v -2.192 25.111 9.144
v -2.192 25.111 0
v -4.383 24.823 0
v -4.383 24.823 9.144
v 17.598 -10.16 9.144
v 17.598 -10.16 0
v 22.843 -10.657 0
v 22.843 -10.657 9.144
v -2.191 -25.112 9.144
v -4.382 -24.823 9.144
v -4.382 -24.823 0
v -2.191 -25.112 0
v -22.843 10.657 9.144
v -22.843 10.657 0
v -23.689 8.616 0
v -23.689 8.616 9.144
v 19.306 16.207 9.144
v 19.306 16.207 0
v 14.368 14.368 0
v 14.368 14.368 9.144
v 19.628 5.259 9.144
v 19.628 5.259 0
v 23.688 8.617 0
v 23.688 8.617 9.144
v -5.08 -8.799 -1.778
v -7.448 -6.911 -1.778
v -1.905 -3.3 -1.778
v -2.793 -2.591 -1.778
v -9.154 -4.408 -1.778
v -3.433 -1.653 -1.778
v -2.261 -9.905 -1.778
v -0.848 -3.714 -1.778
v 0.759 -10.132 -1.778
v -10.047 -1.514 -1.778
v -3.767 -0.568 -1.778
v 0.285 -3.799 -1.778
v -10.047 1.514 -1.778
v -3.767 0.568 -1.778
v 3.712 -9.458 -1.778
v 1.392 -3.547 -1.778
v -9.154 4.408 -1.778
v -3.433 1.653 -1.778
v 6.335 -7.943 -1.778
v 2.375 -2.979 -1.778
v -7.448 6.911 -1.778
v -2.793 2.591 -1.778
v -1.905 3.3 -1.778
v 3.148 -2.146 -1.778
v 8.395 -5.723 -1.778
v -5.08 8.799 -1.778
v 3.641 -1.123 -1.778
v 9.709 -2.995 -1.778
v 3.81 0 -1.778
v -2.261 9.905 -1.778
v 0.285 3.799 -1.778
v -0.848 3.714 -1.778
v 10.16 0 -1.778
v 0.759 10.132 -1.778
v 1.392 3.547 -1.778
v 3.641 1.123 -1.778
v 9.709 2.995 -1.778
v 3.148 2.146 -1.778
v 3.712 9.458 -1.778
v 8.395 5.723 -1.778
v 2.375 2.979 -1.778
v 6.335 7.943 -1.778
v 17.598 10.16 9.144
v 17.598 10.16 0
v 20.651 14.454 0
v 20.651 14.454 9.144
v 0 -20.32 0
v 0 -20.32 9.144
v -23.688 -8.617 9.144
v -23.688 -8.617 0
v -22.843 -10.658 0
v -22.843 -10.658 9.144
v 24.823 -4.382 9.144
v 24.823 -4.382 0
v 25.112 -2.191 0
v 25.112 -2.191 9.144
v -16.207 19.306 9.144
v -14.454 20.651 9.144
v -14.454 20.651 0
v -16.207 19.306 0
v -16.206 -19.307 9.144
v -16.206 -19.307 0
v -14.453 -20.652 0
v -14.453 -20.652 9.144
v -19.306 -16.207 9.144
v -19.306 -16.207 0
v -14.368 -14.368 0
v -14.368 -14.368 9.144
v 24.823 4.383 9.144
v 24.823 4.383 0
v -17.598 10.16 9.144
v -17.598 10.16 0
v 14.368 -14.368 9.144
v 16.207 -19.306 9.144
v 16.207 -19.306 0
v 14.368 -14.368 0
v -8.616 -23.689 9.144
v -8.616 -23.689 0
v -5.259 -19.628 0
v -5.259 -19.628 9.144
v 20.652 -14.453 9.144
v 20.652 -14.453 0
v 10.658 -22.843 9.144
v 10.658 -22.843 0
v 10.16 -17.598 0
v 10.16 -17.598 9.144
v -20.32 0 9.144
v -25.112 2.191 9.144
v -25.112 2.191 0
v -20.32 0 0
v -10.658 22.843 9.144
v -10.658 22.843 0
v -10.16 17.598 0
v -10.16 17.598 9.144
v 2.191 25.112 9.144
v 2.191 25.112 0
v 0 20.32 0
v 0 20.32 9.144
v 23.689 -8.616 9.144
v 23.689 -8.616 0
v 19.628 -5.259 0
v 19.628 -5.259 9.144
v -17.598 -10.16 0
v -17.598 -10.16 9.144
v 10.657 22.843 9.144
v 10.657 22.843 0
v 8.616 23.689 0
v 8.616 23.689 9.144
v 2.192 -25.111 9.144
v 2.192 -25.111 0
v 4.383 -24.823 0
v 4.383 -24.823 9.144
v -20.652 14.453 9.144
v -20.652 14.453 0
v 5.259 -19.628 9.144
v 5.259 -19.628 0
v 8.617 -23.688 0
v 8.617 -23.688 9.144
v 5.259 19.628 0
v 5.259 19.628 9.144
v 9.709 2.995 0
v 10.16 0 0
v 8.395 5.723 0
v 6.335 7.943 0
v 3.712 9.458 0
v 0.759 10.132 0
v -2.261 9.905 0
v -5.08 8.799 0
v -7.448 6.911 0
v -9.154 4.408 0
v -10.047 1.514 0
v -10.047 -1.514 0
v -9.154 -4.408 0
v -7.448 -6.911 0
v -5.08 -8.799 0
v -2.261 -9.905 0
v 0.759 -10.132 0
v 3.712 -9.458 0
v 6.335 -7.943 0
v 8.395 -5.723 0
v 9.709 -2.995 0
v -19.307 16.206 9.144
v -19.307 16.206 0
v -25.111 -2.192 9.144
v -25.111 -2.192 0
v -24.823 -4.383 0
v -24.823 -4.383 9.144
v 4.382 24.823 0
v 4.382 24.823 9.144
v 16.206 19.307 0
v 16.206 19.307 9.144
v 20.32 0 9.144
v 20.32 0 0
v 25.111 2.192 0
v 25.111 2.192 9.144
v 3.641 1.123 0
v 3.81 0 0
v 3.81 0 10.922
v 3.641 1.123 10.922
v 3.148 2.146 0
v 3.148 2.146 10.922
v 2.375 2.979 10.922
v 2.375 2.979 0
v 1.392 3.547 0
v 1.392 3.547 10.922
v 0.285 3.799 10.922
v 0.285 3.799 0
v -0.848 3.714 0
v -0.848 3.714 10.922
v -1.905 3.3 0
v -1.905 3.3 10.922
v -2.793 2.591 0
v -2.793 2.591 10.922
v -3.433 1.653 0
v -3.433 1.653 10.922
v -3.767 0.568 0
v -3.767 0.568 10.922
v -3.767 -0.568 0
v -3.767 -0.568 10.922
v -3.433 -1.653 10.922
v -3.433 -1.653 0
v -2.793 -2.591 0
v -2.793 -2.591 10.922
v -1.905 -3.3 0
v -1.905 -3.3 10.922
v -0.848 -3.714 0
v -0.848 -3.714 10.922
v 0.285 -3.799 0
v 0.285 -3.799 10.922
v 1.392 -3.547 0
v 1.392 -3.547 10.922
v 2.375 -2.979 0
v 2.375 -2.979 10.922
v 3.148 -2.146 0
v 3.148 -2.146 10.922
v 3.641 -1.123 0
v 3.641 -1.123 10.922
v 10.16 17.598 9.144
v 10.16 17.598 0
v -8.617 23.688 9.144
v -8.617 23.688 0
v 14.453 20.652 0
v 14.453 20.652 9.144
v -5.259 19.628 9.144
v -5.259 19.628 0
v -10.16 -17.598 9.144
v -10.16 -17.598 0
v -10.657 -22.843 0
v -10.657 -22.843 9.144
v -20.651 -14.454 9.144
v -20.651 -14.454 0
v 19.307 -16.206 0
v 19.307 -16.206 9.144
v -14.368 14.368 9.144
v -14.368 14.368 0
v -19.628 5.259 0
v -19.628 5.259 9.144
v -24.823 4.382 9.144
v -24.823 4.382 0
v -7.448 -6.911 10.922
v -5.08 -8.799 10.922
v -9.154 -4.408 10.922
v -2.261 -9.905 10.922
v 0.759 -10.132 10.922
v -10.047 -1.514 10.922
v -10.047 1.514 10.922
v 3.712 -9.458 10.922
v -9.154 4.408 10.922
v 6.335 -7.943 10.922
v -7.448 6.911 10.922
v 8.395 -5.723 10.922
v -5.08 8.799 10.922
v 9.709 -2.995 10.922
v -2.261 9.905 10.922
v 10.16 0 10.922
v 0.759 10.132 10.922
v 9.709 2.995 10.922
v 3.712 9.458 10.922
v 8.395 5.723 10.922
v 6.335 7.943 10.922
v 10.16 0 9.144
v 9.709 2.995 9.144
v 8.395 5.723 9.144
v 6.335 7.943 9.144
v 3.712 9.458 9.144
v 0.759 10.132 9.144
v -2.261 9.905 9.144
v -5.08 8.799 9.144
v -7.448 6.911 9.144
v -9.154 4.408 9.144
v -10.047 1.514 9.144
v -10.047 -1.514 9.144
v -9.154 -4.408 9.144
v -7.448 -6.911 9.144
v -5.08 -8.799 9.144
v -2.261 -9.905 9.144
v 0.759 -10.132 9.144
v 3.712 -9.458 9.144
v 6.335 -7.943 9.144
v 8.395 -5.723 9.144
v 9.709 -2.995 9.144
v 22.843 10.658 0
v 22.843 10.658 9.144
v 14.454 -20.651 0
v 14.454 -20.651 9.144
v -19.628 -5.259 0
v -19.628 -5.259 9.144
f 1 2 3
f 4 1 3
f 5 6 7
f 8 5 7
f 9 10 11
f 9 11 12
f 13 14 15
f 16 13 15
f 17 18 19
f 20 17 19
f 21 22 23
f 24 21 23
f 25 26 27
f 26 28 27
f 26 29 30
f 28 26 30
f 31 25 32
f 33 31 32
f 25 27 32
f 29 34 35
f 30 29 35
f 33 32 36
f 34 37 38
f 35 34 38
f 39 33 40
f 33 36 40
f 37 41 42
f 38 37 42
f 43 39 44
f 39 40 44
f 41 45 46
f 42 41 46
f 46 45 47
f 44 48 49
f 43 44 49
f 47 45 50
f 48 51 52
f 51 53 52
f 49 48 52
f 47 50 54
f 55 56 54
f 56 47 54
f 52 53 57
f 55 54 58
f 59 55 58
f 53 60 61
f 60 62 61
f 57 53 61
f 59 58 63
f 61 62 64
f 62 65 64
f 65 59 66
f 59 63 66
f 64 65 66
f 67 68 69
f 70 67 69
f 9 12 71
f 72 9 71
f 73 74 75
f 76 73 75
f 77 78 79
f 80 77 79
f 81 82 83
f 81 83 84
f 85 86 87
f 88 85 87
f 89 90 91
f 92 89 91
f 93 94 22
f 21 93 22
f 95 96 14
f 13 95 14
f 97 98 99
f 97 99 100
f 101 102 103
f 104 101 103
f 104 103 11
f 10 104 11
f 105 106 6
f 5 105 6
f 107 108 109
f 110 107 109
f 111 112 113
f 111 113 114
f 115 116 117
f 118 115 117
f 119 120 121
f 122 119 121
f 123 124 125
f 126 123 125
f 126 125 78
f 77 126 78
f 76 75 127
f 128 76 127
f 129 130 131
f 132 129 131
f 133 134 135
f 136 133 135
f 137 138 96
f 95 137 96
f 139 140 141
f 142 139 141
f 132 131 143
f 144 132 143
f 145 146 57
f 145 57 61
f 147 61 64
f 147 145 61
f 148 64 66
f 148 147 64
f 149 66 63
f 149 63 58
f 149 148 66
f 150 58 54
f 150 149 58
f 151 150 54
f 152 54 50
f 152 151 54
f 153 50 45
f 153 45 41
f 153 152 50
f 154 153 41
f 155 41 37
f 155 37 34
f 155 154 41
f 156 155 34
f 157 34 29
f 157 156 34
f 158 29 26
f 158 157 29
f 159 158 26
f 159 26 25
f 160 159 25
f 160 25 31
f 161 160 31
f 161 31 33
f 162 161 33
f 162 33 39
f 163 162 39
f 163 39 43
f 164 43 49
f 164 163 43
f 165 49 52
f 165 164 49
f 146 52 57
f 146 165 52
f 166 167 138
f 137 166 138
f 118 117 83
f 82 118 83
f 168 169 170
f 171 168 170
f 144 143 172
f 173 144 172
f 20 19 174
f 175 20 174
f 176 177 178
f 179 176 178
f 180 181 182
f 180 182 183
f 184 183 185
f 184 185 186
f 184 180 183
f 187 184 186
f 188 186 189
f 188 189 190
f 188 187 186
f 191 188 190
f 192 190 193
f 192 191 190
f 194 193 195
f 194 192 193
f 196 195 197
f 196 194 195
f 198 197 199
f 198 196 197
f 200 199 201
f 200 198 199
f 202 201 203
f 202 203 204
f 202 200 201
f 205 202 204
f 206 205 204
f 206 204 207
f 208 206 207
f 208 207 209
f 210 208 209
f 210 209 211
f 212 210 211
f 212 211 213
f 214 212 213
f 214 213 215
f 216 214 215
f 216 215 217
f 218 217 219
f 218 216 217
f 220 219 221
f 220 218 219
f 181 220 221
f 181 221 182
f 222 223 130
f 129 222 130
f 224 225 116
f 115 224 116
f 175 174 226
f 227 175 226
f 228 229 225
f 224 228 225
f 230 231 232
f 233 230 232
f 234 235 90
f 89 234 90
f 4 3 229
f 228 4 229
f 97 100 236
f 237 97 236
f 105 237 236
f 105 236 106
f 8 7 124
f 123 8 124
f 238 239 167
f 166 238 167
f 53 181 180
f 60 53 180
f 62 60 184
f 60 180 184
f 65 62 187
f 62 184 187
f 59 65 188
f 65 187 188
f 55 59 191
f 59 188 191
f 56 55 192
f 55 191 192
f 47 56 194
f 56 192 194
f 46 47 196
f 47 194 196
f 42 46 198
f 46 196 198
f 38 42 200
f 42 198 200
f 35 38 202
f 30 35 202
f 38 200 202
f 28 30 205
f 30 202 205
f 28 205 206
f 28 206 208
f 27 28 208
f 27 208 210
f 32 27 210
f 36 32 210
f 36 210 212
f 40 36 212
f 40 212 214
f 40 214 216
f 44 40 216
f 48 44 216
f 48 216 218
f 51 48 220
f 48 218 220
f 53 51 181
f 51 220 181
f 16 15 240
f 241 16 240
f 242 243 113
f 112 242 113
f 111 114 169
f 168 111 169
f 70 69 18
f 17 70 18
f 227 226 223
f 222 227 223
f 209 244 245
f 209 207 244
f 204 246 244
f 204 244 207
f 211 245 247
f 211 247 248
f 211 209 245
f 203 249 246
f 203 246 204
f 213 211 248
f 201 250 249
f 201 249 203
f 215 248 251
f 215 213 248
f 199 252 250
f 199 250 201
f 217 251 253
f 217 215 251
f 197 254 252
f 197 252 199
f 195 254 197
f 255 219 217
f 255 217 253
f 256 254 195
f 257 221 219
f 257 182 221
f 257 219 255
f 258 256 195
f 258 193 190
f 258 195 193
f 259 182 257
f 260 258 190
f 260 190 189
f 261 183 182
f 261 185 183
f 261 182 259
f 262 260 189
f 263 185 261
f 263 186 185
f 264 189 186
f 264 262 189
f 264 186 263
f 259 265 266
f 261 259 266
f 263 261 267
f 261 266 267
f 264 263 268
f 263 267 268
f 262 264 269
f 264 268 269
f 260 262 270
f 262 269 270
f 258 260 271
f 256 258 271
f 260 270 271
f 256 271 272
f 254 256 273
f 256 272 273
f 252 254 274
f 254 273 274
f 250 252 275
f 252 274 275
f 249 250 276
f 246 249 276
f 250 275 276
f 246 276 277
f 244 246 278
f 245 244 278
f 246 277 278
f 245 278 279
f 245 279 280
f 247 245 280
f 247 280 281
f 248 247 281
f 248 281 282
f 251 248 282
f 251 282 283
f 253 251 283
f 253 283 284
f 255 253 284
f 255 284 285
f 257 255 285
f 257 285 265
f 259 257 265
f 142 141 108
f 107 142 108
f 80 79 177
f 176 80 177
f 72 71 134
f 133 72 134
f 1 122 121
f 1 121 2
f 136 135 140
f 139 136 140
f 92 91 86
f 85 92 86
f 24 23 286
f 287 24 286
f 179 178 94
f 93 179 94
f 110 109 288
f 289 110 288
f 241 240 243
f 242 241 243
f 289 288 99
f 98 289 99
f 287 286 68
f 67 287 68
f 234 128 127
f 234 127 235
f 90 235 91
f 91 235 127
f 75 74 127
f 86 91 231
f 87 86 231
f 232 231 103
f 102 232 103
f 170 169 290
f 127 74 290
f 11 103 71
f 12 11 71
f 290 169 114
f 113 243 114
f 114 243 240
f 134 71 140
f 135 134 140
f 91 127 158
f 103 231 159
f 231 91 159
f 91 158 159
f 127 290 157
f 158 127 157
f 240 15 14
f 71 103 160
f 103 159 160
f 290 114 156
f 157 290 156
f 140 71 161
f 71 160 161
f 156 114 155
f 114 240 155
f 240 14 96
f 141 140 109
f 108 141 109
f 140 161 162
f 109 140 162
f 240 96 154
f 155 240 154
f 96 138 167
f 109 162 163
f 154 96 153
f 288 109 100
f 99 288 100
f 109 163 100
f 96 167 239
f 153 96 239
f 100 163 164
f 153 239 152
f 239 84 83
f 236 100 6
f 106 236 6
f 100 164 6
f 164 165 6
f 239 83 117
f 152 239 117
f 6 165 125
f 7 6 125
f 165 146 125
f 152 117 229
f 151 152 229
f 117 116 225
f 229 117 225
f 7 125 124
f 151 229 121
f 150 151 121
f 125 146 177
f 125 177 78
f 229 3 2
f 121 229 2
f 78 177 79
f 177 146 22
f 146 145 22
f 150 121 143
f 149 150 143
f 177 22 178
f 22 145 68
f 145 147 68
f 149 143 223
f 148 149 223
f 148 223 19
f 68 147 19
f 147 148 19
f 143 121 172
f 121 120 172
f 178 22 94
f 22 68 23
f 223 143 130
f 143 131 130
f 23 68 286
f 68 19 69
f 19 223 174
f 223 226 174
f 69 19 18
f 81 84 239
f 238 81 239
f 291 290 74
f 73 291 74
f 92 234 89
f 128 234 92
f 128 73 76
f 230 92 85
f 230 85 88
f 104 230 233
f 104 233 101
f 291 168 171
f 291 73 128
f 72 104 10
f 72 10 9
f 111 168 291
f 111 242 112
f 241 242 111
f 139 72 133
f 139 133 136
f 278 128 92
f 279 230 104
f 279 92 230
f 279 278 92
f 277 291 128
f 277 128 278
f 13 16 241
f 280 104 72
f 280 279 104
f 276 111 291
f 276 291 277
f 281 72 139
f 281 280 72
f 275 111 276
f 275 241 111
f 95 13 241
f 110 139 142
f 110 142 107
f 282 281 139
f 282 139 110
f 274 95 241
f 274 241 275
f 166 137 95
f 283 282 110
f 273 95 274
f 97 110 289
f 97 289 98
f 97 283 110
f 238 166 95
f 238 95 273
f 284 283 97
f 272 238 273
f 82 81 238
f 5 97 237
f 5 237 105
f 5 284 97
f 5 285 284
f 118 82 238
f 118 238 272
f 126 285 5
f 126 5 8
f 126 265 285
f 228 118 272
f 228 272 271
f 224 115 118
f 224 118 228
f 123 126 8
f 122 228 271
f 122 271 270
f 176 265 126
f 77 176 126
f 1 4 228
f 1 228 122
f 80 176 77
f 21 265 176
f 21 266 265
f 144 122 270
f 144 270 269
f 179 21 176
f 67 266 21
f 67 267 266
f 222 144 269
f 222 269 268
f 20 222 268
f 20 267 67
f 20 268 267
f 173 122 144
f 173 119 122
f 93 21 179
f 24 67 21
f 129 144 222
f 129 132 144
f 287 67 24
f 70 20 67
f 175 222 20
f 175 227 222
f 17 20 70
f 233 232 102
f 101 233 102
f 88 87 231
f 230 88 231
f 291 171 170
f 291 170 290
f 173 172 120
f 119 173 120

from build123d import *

# Parameters (mm, degrees)
F0_R     = 10.16
F1_DEPTH = 9.144
F0_R_2   = 3.81
F2_DEPTH = 10.922
F3_DEPTH = 1.778


with BuildPart() as f1:
    # F0 (on Top) → F1 (new body)
    with BuildSketch(Plane.XY):
        Polygon((-2.192223, 25.111405), (-4.383126, 24.822963), (-5.259222, 19.627621), (-8.616823, 23.68837), (-10.658424, 22.842703), (-10.16, 17.597653), (-14.454226, 20.650987), (-16.207359, 19.305753), (-14.368424, 14.368424), (-19.306565, 16.206318), (-20.651826, 14.453159), (-17.597653, 10.16), (-22.843211, 10.65718), (-23.688878, 8.615604), (-19.627621, 5.259197), (-24.823141, 4.381805), (-25.111583, 2.190902), (-20.32, 0), (-25.111405, -2.192198), (-24.822963, -4.3831), (-19.627621, -5.259197), (-23.68837, -8.616823), (-22.842703, -10.658399), (-17.597653, -10.16), (-20.651013, -14.4542), (-19.305753, -16.207359), (-14.368424, -14.368399), (-16.206318, -19.306565), (-14.453159, -20.6518), (-10.16, -17.597628), (-10.65718, -22.843211), (-8.615604, -23.688853), (-5.259222, -19.627596), (-4.381805, -24.823115), (-2.190902, -25.111558), (0, -20.32), (2.192198, -25.11138), (4.3831, -24.822937), (5.259197, -19.627596), (8.616823, -23.688345), (10.658399, -22.842703), (10.16, -17.597628), (14.4542, -20.650987), (16.207359, -19.305753), (14.368399, -14.368399), (19.306565, -16.206292), (20.6518, -14.453159), (17.597628, -10.16), (22.843211, -10.65718), (23.688853, -8.615578), (19.627596, -5.259197), (24.823115, -4.381779), (25.111558, -2.190902), (20.32, 0), (25.11138, 2.192223), (24.822937, 4.383126), (19.627596, 5.259197), (23.688345, 8.616823), (22.842677, 10.658424), (17.597628, 10.16), (20.650987, 14.4542), (19.305753, 16.207359), (14.368399, 14.368424), (16.206292, 19.306565), (14.453133, 20.6518), (10.16, 17.597653), (10.65718, 22.843211), (8.615578, 23.688878), (5.259197, 19.627621), (4.381779, 24.823141), (2.190877, 25.111558), (0, 20.32), align=None)
        Circle(F0_R, mode=Mode.SUBTRACT)
    extrude(amount=F1_DEPTH)

    # F0 (on Top) → F2 (join)
    with BuildSketch(Plane.XY):
        Circle(F0_R)
        Circle(F0_R_2, mode=Mode.SUBTRACT)
    extrude(amount=F2_DEPTH)

    # F0 (on Top) → F3 (join)
    with BuildSketch(Plane.XY):
        Circle(F0_R)
        Circle(F0_R_2, mode=Mode.SUBTRACT)
    extrude(amount=-F3_DEPTH)


solid = f1.part
